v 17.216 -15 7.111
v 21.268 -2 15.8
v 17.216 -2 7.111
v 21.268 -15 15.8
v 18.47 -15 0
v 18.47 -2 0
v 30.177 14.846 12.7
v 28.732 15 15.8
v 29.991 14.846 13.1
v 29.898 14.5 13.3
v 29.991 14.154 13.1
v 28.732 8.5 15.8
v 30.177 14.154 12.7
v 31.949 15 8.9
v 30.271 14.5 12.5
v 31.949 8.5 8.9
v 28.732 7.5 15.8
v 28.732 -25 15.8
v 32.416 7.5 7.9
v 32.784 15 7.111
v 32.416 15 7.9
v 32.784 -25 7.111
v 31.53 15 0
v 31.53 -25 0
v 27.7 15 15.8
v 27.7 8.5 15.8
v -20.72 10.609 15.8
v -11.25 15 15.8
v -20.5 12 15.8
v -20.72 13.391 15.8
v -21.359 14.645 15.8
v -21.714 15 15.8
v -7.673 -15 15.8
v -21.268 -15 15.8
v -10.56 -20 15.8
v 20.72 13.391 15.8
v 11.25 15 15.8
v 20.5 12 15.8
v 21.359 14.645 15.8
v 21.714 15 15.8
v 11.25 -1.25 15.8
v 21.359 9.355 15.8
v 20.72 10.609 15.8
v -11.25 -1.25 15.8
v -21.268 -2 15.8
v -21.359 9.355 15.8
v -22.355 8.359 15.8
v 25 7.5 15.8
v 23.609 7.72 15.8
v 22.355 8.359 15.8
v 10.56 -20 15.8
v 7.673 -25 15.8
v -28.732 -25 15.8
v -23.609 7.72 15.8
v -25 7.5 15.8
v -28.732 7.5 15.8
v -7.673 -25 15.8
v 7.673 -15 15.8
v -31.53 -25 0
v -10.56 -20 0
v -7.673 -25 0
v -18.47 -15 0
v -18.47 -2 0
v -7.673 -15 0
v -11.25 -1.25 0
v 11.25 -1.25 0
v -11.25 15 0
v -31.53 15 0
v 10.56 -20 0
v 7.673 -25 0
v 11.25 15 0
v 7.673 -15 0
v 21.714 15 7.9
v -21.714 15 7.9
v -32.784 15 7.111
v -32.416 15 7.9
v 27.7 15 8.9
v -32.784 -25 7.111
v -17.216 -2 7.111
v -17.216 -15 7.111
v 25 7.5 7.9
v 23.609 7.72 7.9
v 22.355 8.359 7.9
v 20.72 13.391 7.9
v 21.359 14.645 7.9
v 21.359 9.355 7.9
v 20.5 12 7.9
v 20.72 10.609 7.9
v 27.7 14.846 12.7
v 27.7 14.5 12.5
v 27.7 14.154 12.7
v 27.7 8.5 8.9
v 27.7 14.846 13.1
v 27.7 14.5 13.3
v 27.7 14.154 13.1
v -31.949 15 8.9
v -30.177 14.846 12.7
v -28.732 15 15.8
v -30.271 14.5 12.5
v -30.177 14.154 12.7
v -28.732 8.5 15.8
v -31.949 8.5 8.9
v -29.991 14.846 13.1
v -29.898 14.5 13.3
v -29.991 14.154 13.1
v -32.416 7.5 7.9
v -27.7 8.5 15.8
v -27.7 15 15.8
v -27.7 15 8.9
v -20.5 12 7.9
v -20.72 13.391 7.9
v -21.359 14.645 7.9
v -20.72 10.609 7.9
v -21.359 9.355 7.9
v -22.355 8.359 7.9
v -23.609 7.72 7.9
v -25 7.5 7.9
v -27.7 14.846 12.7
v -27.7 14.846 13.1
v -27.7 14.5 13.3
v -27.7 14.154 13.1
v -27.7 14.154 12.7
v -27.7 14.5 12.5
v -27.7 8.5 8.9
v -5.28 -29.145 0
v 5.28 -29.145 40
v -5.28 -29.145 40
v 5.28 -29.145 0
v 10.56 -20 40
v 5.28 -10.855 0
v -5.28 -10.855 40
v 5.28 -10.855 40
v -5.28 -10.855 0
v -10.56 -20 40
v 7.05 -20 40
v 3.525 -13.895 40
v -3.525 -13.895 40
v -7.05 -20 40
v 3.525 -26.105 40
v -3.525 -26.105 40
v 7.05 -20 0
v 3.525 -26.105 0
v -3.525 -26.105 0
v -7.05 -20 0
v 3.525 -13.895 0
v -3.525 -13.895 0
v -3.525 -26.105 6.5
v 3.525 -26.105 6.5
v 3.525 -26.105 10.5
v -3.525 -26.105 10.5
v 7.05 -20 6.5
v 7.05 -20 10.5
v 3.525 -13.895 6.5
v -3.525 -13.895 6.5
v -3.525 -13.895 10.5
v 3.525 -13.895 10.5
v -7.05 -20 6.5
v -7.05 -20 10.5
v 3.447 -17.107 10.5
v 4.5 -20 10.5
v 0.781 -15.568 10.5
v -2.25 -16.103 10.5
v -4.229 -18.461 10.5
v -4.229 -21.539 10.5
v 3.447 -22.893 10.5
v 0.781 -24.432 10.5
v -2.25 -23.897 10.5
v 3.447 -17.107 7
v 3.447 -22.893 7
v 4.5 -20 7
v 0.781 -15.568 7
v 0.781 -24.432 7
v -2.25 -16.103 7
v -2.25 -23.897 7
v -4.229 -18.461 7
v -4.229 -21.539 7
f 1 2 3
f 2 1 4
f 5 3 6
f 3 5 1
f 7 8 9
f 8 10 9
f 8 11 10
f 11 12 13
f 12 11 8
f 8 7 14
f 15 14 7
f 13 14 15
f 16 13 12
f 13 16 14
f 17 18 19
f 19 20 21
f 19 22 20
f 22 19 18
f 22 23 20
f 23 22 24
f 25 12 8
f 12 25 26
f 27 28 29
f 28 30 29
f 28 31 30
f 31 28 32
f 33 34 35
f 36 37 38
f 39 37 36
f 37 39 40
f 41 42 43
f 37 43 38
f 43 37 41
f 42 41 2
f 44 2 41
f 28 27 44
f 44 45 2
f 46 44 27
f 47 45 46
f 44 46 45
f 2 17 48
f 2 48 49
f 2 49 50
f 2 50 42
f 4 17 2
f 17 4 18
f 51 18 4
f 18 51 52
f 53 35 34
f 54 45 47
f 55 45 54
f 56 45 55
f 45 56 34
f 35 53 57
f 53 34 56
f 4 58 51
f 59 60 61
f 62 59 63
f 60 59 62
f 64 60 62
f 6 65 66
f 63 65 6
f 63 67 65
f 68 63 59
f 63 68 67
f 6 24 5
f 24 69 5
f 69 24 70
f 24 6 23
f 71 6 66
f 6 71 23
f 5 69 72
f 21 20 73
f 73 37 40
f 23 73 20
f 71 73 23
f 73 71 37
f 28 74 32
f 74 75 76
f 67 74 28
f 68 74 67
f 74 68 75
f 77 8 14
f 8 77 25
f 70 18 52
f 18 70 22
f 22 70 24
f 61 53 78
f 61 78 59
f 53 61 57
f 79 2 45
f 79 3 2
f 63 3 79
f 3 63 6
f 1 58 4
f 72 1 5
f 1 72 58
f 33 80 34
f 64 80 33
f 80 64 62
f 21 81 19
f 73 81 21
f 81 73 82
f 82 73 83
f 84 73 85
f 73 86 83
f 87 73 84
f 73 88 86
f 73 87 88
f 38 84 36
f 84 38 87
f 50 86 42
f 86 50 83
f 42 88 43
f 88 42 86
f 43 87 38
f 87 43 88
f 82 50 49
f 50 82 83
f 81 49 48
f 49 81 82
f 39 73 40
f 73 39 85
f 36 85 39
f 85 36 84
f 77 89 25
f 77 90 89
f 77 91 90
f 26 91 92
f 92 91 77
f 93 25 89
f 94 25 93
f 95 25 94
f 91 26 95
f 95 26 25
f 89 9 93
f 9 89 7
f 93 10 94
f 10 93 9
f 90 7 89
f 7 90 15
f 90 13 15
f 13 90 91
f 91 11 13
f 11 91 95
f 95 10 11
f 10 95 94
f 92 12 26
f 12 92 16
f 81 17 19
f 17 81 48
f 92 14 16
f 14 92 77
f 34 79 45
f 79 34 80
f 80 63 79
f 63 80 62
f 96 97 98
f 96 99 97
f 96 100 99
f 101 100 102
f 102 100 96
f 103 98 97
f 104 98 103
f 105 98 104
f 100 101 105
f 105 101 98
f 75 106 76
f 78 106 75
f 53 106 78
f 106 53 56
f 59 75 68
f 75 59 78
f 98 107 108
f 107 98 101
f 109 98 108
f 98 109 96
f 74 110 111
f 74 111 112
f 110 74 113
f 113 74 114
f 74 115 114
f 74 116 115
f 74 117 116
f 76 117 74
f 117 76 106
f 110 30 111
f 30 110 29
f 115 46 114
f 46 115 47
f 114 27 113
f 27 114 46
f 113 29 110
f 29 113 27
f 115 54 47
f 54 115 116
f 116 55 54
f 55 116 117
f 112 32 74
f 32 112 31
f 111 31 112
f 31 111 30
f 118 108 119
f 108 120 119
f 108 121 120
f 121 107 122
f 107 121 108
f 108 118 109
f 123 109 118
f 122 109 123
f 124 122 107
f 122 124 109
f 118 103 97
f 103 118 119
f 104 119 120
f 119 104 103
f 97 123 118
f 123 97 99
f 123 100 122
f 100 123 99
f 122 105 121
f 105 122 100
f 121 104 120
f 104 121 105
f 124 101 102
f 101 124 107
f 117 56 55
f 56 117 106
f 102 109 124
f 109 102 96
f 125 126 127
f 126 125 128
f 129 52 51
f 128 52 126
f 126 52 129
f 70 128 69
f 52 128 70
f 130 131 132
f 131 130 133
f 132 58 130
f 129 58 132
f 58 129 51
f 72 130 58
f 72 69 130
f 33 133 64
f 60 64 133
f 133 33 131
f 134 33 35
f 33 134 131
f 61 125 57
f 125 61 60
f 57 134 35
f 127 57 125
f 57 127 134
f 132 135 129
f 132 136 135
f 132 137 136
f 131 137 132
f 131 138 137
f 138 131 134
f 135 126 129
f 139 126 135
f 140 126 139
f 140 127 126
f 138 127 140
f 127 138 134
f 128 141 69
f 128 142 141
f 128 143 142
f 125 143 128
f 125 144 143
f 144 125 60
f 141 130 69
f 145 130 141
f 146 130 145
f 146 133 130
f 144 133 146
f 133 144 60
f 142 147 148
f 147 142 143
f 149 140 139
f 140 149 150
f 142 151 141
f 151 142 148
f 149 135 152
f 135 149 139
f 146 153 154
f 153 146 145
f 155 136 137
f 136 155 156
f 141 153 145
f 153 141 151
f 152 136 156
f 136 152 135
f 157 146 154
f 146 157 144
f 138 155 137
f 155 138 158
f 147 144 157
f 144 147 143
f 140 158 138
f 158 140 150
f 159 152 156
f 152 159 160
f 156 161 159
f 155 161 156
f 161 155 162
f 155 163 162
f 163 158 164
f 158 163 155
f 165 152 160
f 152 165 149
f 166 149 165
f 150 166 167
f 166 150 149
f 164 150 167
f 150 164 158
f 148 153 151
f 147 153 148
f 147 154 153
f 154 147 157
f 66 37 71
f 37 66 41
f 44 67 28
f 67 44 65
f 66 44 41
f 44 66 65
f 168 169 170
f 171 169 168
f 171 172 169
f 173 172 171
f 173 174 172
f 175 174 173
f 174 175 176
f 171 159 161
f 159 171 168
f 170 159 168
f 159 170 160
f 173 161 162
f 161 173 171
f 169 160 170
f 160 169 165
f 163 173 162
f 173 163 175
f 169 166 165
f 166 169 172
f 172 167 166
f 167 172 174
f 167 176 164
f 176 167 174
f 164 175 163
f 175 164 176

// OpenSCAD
// file: functions.scad
// PRUSA Mendel  
// Functions used in many files
// GNU GPL v2
// Josef Průša
// josefprusa@me.com
// prusadjs.cz
// http://www.reprap.org/wiki/Prusa_Mendel
// http://github.com/prusajr/PrusaMendel

module nut(d,h,horizontal=true){
cornerdiameter =  (d / 2) / cos (180 / 6);
cylinder(h = h, r = cornerdiameter, $fn = 6);
if(horizontal){
for(i = [1:6]){
	rotate([0,0,60*i]) translate([-cornerdiameter-0.2,0,0]) rotate([0,0,-45]) cube(size = [2,2,h]);
}}
}

// By nophead
module polyhole(d,h) {
    n = max(round(2 * d),3);
    rotate([0,0,180])
        cylinder(h = h, r = (d / 2) / cos (180 / n), $fn = n);
}




module roundcorner(diameter){
	difference(){
		cube(size = [diameter,diameter,99], center = false);
		translate(v = [diameter, diameter, 0]) cylinder(h = 100, r=diameter, center=true);
	}
}
// file: metric.scad
// PRUSA Mendel  
// Default metric sizes
// GNU GPL v3
// Josef Průša
// josefprusa@me.com
// prusadjs.cz
// http://www.reprap.org/wiki/Prusa_Mendel
// http://github.com/prusajr/PrusaMendel

// DONT CHANGE THIS FILE! ALTER VALUES IN CONFIGURATION.SCAD INSTEAD

// RODS

threaded_rod_diameter = 8.7;
threaded_rod_diameter_horizontal = 8.7;
smooth_bar_diameter = 8;
smooth_bar_diameter_horizontal = 8.5;

// Nuts and bolts

m8_diameter = 9;
m8_nut_diameter = 14.1;

m4_diameter = 4.5;
m4_nut_diameter = 9;

m3_diameter = 3.6;
m3_nut_diameter = 5.5;
m3_nut_diameter_horizontal = 6.1;

// Bushing holder

bushing_core_diameter = smooth_bar_diameter;
bushing_material_thickness = 1;

// Motors

motor_shaft = 5.5;
// file: teardrop.scad
teardropcentering2();
padded_teardrop();

module teardrop (r=4.5,h=20, r_mult=1)
{
	union(){
		cylinder(r=r, h=h, $fn=20);
		teardrop_poly(r=r, h=h, r_mult=r_mult);
	}
}

module teardrop_poly (r=4.5,h=20, r_mult=1.2)
{
	linear_extrude(height=h)
	{
		polygon(points=[[0,0],[r*cos(30),r*sin(30)],[0.5*r,r_mult*r],[-0.5*r,r_mult*r],[-r*cos(30),r*sin(30)]],
				paths=[[0,1,2,3,4]]);
	}
}

module teardropcentering (r=4.5,h=20)
{
    {
		teardrop(r=r, h=h, r_mult=1.2);
	}
}

module teardropcentering2 (r=4.5,h=20)
{
	difference(){
        teardrop(r=r, h=h, r_mult=1.2);
	translate(v = [-1.5*r, -1.5*r,-1])cube(size =[3*r,1.5*r,h+2]);
	}
}

module padded_teardrop(r = 4, h = 15, diameter_adjust = 0.5, internal_offset = 0, pressure_pad_height_ratio=0.325, add_strenght = 1, cut_spacing = 5, cut_h=5.5, magic = 10, cut_width=1)
{

	//r is real radius, as measured on steel.
    // (real object has radius bigger by diameter_adjust
	//h is lenght of pressure pad, including cutouts.
	// (Real object has teardrop part enlarged by
    // magic number to positive direction and by internal_offset to negative direcion

	// you should not have to change to change latter
	//diameter_adjust is here due to wall width, or something like this.
	//pressure_pad_height_ratio is how far the pressure pad sticks into the rod hole

	//add_strenght enables 'cuts' to trick skeinforge into putting more plastic
	//  into pressure pad, greatly strenghtening it.
	//  set to 1 for cylindrical, 2 for slot cuts.
	//cut_spacing is distance between cuts. for cylindrical cuts every odd cut
	//  is offset by cut_spacing/2
	// cut_h is height of cuts, you should be able to fine tune it so it begins in object layer 2
	//magic is here to assure that when substracting we get out of the object
    //cut_width is distande between pressure pad and object

	//always substract just from nearest wrapping object

	difference(){
		//axe hole
        translate([0, 0, -internal_offset])
		  teardropcentering((r+diameter_adjust), h+magic+internal_offset);
		//pressure pad
		rotate([0,-90,90])
		translate([
			0,
			-(r+diameter_adjust),
			(-(r+diameter_adjust))-(r-(r*pressure_pad_height_ratio))-magic
			])
			cube(size = [
				h,
				(r+diameter_adjust)*2,(r+diameter_adjust)+magic]);
	}
	rotate([0,-90,90]) {
		//cutting along the axis
		//this one goes thru
		translate(v = [0, -(r+diameter_adjust), -(r+diameter_adjust)-magic])
			cube(size = [h,cut_width,(r+diameter_adjust)+magic]);
		//this one does not
		translate(v = [0, (r+diameter_adjust)-cut_width, -(r+diameter_adjust)])
			cube(size = [h,cut_width,(r+diameter_adjust)]);
		//cuts across axis, both go thru
		translate(v = [0, -(r+diameter_adjust), -(r+diameter_adjust)-magic])
			cube(size = [cut_width,(r+diameter_adjust)*2,(r+diameter_adjust)+magic]);
		translate(v = [h-cut_width, -(r+diameter_adjust), -(r+diameter_adjust)-magic])
			cube(size = [cut_width,(r+diameter_adjust)*2,(r+diameter_adjust)+magic]);

		if(add_strenght==1){
			//cylinder cut
			translate([cut_spacing,0,0]) {
				for (i=[1:h/cut_spacing]){
					translate(v = [(i-1)*cut_spacing, (r+diameter_adjust)-r/2, -(r+diameter_adjust)])
						cylinder(h = cut_h, r=0.4, $fn=6, center=true);
					translate(v = [(i-1)*cut_spacing- (cut_spacing/2) , (r+diameter_adjust)+r/2, -(r+diameter_adjust)])
						cylinder(h = cut_h, r=0.4, $fn=6, center=true);
				}
			}
		} 
		if (add_strenght == 2){
			//slot cut
			for (i=[1:h/cut_spacing]){
				translate(v = [i*cut_spacing, (r+diameter_adjust)-r/2, -(r+diameter_adjust)-cut_h/2])
					cube([0.4,r,cut_h]); 
			}
		}
	}
}
// file: bushing.scad
// PRUSA Mendel  
// Bushings
// GNU GPL v3
// Josef Průša
// josefprusa@me.com
// prusadjs.cz
// http://www.reprap.org/wiki/Prusa_Mendel
// http://github.com/prusajr/PrusaMendel

include <configuration.scad>

/**
 * @id bushing
 * @name Bushing
 * @category Printed
 * @id bushing
 */ 



module bushing(stiff, lenght=11){
	difference(){
		union(){
			translate(v=[-7.5,-8,0])cube(size = [15,8,lenght]);
			cylinder(h = lenght, r=7.5);
		}
	//cutout inside
	//Opening
	rotate(a=[0,0,45]) translate(v=[1,1,-1]) cube(size = [16,16,lenght+2]);
	//Cutouts to make it more bendy
	if(stiff){
		translate(v=[-4.8,-6,-1]) cube(size = [0.8,6,lenght+2]);
		translate(v=[4,-6,-1]) cube(size = [0.8,6,lenght+2]);
	}else{
		translate(v=[-4.8,-8,-1]) cube(size = [0.8,8,lenght+2]);
		translate(v=[4,-8,-1]) cube(size = [0.8,8,lenght+2]);
	}
	translate(v=[0,5,(lenght+2)/2]) cube(size = [7,8,lenght+2], center=true);
	translate(v=[0,0,-1]) cylinder(h = lenght+2, r=5);
	}
}


module standart_bushing(){

difference(){translate(v=[0,5,8])rotate(a=[90,0,0]){
bushing(false, 10);
translate(v=[-7,-13,0])cube(size = [14,5,10]);
translate(v=[-2,-13,-3])cube(size = [4,5,16]);
translate(v=[-2,-12,-3])cube(size = [4,7.5,2]);
translate(v=[-2,-12,11])cube(size = [4,7.5,2]);
}
translate(v=[-3,-1,-16])rotate(a=[45,0,0])cube(size = [6,5,16]);

mirror([ 0, 1, 0 ]) translate(v=[-3,-1,-16])rotate(a=[45,0,0])cube(size = [6,5,16]);}
}


// Includes small cutouts for better prints
module vertical_bushing(stiff, lenght){
difference(){
bushing(stiff, lenght);
translate(v=[-5,0,-1]) cube(size = [10,2.5,lenght+2]);
}
}


//vertical_bushing(true, 11);

module z_bushings(){
// STUFF FOR X-ENDS
difference(){
// Slider.
translate([0,6.5,30]) 
cube([23,17,60],center=true);
// Slider cutout.
translate([0,10,32.5]) 
cube([17,17,70],center=true);
}
union(){translate([0,9.5,0])vertical_bushing(true,13);
	//translate([0,4,0.5])cube(size = [8,2,1], center = true);
	//translate([0,4,12.5])cube(size = [8,2,1], center = true);
	translate([0,9.5,48])vertical_bushing(true,13);
	//translate([0,4,48+0.5])cube(size = [8,2,1], center = true);
	//translate([0,4,48+12.5])cube(size = [8,2,1], center = true);
	translate([0,9.5,32])
	{
		difference()
		{
			bushing(true,16);
			translate([0,3,2]) 
			rotate([45,0,0])
			cube([16,30,16], center=true);
		}
	}
}
}


// Linear bushing options


lm8uu_diameter=(lme8uu==true) ? 16 : 15;
lm8uu_length=(lme8uu==true) ? 25 : 24;
lm8uu_radius = lm8uu_diameter / 2;
block_height = 2*lm8uu_length+17;



//z_bushings();
//
//linear_holder_base(60);
//cut_corners(true, false, true, false); 

module cut_corners(lf,lb,rf,rb){
	difference(){
	lm8uu_bearing_holder();
	if(lf) translate(v=[(10)-3,(-28.5/2)+3,0]) rotate(a=[0,0,45]) rotate(a=[35,0,0]) translate(v=[0,-5,0]) cube(size = [20,10,20], center = true);
	if(lb)translate(v=[(-10)+3,(-28.5/2)+3,0]) rotate(a=[0,0,-45]) rotate(a=[35,0,0]) translate(v=[0,-5,0]) cube(size = [20,10,20], center = true);
	mirror([ 0, 1, 0 ]){
	if(rf)translate(v=[(10)-3,(-28.5/2)+3,0]) rotate(a=[0,0,45]) rotate(a=[35,0,0]) translate(v=[0,-5,0]) cube(size = [20,10,20], center = true);
	if(rb)translate(v=[(-10)+3,(-28.5/2)+3,0]) rotate(a=[0,0,-45]) rotate(a=[35,0,0]) translate(v=[0,-5,0]) cube(size = [20,10,20], center = true);
	}
}
//lm8uu_bearing_holder();
}

module linear_holder_base(length){
	
difference(){
union(){
//main block
//translate(v=[-(lm8uu_radius+2.5)/2,0,block_height/2]) cube(size = [lm8uu_radius+2.5,lm8uu_diameter+5,block_height], center = true);
translate(v=[-5,0,length/2]) cube(size = [10,20,length], center = true);

//holder for main block in x-end
// leaving it out now
//translate(v=[0,0,0]) cylinder(h = length, r=10, $fn=60);

//translate(v=[-5,0,15.8/2]) cube(size = [12,23,15.8], center = true);
//translate(v=[0,0,0]) cylinder(h = block_height, r=lm8uu_radius+2.5, $fn=60);
}
//main axis
translate(v=[0,0,-2]) cylinder(h = length+4, r=(lm8uu_diameter+0.8)/2, $fn=50);
// not needed for zip tie
//main cut
//translate(v=[10,0,length/2]) cube(size = [20,14,length+4], center = true);
//smooth entry cut
//translate(v=[12,0,length/2]) rotate(a=[0,0,45]) cube(size = [20,20,length+4], center = true);
}
}


module y_linear_bearings(){
	difference(){
		union(){
translate(v=[0,0,1.5]) cube(size = [26,14,3], center = true);
translate(v=[-13,0,0])rotate(a=[0,0,30])cylinder(h = 3, r=7, $fn=6);
translate(v=[13,0,0])rotate(a=[0,0,30])cylinder(h = 3, r=7, $fn=6); 
}


translate(v=[-14,0,0])polyhole(m3_diameter, 10);
translate(v=[14,0,0])polyhole(m3_diameter, 10);
//hack
translate(v=[0,14.25,4.5]) rotate(a=[90,0,0]) translate(v=[0,9.5,0]) rotate(a=[0,0,90]){
	translate(v=[0,0,lm8uu_length/2+0.5]) ziptie();
}
}

cut_corners(true, true, true, true); 


 
}

lm8uu_holder_length = lm8uu_length+4.5;
lm8uu_holder_width= lm8uu_diameter+5;

module lm8uu_bearing_holder(){
translate(v=[0,14.25,4.5])rotate(a=[90,0,0])translate(v=[0,9.5,0]) rotate(a=[0,0,90]){

difference(){
	union(){
		linear_holder_base(lm8uu_length+4.5);
		translate(v=[-10-2,0,lm8uu_holder_length/2]) cube(size = [4,20,lm8uu_holder_length], center = true);
	}
	translate(v=[0,0,12.5]) ziptie();
}


translate(v=[-(10-5.5)/2-5.5,0,0.75]) cube(size = [10-5.5,20,1.5], center = true);
#translate(v=[-(10-5.5)/2-5.5,0,lm8uu_length+3.75]) cube(size = [10-5.5,20,1.5], center = true);

}
}

module lm8uu_bearing_cut()
	{
		translate([-lm8uu_holder_width/2,-lm8uu_holder_length/2,-5])cube([lm8uu_holder_width,lm8uu_holder_length,20]);
	}


module z_linear_bearings(){
translate(v=[0,9.5,0]) rotate(a=[0,0,90]){
difference(){
linear_holder_base(65);

translate(v=[0,0,14.5+2]) ziptie();
translate(v=[0,0,block_height-(12+2)-5]) ziptie();
}

//x-end adapter
difference(){
translate(v=[-6,0,15.8/2]) cube(size = [10,23,15.8], center = true);
translate(v=[0,0,-2]) cylinder(h = 20, r=7.9, $fn=50);
}


translate(v=[-(10-5.5)/2-lm8uu_radius+2,0,0+1]) cube(size = [10-5.5,20,2], center = true);
translate(v=[-(10-5.5)/2-lm8uu_radius+2,0,lm8uu_length+4.0]) cube(size = [10-5.5,20,2], center = true);
translate(v=[-(10-5.5)/2-lm8uu_radius+2,0,64-lm8uu_length-3]) cube(size = [10-5.5,20,2], center = true);
translate(v=[-(10-5.5)/2-lm8uu_radius+2,0,64]) cube(size = [10-5.5,20,2], center = true);
}
}

module ziptie(){
difference(){
translate(v=[0,0,0]) cylinder(h = 3.9, r=lm8uu_diameter);
translate(v=[0,0,0]) cylinder(h = 5, r=lm8uu_diameter-3, $fn=50);
translate(v=[0,0,3]) cylinder(h = 1, r1=lm8uu_diameter-3, r2=lm8uu_diameter, $fn=50);
}}
// file: configuration.scad
// PRUSA Mendel  
// Configuration file
// GNU GPL v3
// Josef Průša
// josefprusa@me.com
// prusadjs.cz
// http://www.reprap.org/wiki/Prusa_Mendel
// http://github.com/prusajr/PrusaMendel

// PLEASE SELECT ONE OF THE CONFIGURATIONS BELOW
// BY UN-COMMENTING IT

// Uncomment for metric settings
// METRIC METRIC METRIC METRIC METRIC METRIC METRIC METRIC 

include <metric.scad>;

// CUSTOM CUSTOM CUSTOM CUSTOM CUSTOM CUSTOM CUSTOM CUSTOM CUSTOM

thin_wall = 3;

// LM8UU
linear = true;


// CHANGE ONLY THE STUFF YOU KNOW
// IT WILL REPLACE DEFAULT SETTING

// RODS

// threaded_rod_diameter = 0;
// threaded_rod_diameter_horizontal = 0;
// smooth_bar_díameter = 0;
// smooth_bar_díameter_horizontal = 0;

// Nuts and bolts

// m8_diameter = 0;
// m8_nut_diameter = 0;

// m4_diameter = 0;
// m4_nut_diameter = 0;

// m3_diameter = 0;
// m3_nut_diameter = 0;

// Bushing holder

// bushing_core_diameter = smooth_bar_díameter;
// bushing_material_thickness = 0;


///counted stuff
m3_nut_diameter_bigger = ((m3_nut_diameter  / 2) / cos (180 / 6))*2;

// functions 
include <functions.scad>
// main file
// PRUSA Mendel  
// X-end prototype for
// GNU GPL v2
// Josef Prusa
// josefprusa@me.com
// prusadjs.cz
// http://www.reprap.org/wiki/Prusa_Mendel
// http://github.com/prusajr/PrusaMendel
// Thanks to GregFrost for refactoring!

include <configuration.scad>
corection = 1.17; 
use <bushing.scad>
use <teardrop.scad>

axis_diameter_real=4;
axis_diameter_larger=4.5;
pressure_pad_height=1.4;
add_strenght=1;
xend_height=15.8;
xend_length=40;
solid_end_width=3;
slot_width=1;

pad_height=5.2;
pad_width=7;
pad_connector_height=3.3;
bushing_support_width=17;
rod_support_width=10;

module xend_side(closed_end=true,curved_sides=false)
{
	translate([25,0,0])
	difference ()
	{
		union()
		{
			if (curved_sides)
			{
				for (i=[0:1])
				rotate(90) 
				rotate([180*i,0,0])
				teardrop(r=xend_height/2,h=xend_length);
			}
			else
			{
				difference ()
				{
					translate([0,xend_length/2,0])
					cube([xend_height,xend_length,xend_height],center=true);
	
					for (i=[0:1])
					translate([0,xend_length/2,0])
					rotate(i*180)
					{
					translate([-12,0,2]) 
					rotate([0,25,0]) 
					cube([10,xend_length+2,20],center=true);

					translate([-13,0,0]) rotate(a=[0,-10,0]) 
					cube([10,xend_length+2,20],center=true);
					}

//					mirror() translate(v = [-12,0,2]) rotate(a=[0,25,0]) translate(v = [0,-3.5,0]) 
//					cube(size = [10,13,20], center = true);


//					mirror() translate(v = [-13,0,]) rotate(a=[0,-10,0]) 
//					translate(v = [0,-3.5,0]) 
//					cube(size = [10,13,20], center = true);
				}
			}

			translate([-26,xend_length-bushing_support_width,-xend_height/2])
			cube([26,bushing_support_width,xend_height]);

			translate([-26,0,-xend_height/2])
			cube([26,rod_support_width,xend_height]);
		}

		difference ()
		{
			union ()
			{
			translate([0,xend_length-3,0])
			rotate(-90,0, 0)
//			teardropcentering(
			padded_teardrop(
				r=axis_diameter_real,
				h=xend_length-6,
				internal_offset=closed_end?0:10
				);

			}


		}

	}
}
//xend_side();
module xend(closed_end=true)
{
	
	if(linear==1) z_linear_bearings();
	if(linear==0) z_bushings();	
difference()
	{
		union ()
		{
			translate(v = [0,-25,xend_height/2])
			{
				xend_side(closed_end=closed_end,curved_sides=0);
				mirror([1,0,0]) xend_side(closed_end=closed_end,curved_sides=0);
			}	


			//Nut Trap
			translate([0,-20,0]) //
			cylinder(h=40,r=m8_nut_diameter/2+thin_wall*corection,$fn=6);
		}

		// Slider cutout.
		translate([0,10,32.5]) 
		cube([22.5,22.5,70],center=true);

		//Rod hole.
		difference()
		{
			translate([0,-20,39.5]) 
			cylinder(h=90,r=m8_nut_diameter/2,$fn=6,center=true);
			translate([0,-20,8.5]) 
			cylinder(h=4,r=m8_nut_diameter/2+thin_wall,$fn=6,center=true);
		}
		translate([0,-20,52]) 
		cylinder(h=90,r=m8_diameter/2,$fn=9,center=true);
	}
}

module xendcorners(dia1, dia2, dia3, dia4, height=0)
{
	translate(v = [0,35,24.5]) 
	union()
	{ 
		//round corners
		translate(v = [33.1, -60.1, -25]) rotate(a=[0,0,90]) roundcorner(dia1);
		translate(v = [33.1, -19.9, -25]) rotate(a=[0,0,-180]) roundcorner(dia2);
		translate(v = [-33.1,-60.1,-25]) rotate(a=[0,0,0]) roundcorner(dia3);
		translate(v = [-33.1, -19.9, -25]) rotate(a=[0,0,-90]) roundcorner(dia4);
	}
}
//xendcorners(5,5,5,5,0);
//difference(){
xend(true);
//translate(v = [15, -40, 0]) cube(size = [20,100,20]);

//translate(v = [-15-20, -40, 0]) cube(size = [20,100,20]);

//translate(v = [-50, -45, 0]) cube(size = [100,40,100]);
//}
//xend_side();
